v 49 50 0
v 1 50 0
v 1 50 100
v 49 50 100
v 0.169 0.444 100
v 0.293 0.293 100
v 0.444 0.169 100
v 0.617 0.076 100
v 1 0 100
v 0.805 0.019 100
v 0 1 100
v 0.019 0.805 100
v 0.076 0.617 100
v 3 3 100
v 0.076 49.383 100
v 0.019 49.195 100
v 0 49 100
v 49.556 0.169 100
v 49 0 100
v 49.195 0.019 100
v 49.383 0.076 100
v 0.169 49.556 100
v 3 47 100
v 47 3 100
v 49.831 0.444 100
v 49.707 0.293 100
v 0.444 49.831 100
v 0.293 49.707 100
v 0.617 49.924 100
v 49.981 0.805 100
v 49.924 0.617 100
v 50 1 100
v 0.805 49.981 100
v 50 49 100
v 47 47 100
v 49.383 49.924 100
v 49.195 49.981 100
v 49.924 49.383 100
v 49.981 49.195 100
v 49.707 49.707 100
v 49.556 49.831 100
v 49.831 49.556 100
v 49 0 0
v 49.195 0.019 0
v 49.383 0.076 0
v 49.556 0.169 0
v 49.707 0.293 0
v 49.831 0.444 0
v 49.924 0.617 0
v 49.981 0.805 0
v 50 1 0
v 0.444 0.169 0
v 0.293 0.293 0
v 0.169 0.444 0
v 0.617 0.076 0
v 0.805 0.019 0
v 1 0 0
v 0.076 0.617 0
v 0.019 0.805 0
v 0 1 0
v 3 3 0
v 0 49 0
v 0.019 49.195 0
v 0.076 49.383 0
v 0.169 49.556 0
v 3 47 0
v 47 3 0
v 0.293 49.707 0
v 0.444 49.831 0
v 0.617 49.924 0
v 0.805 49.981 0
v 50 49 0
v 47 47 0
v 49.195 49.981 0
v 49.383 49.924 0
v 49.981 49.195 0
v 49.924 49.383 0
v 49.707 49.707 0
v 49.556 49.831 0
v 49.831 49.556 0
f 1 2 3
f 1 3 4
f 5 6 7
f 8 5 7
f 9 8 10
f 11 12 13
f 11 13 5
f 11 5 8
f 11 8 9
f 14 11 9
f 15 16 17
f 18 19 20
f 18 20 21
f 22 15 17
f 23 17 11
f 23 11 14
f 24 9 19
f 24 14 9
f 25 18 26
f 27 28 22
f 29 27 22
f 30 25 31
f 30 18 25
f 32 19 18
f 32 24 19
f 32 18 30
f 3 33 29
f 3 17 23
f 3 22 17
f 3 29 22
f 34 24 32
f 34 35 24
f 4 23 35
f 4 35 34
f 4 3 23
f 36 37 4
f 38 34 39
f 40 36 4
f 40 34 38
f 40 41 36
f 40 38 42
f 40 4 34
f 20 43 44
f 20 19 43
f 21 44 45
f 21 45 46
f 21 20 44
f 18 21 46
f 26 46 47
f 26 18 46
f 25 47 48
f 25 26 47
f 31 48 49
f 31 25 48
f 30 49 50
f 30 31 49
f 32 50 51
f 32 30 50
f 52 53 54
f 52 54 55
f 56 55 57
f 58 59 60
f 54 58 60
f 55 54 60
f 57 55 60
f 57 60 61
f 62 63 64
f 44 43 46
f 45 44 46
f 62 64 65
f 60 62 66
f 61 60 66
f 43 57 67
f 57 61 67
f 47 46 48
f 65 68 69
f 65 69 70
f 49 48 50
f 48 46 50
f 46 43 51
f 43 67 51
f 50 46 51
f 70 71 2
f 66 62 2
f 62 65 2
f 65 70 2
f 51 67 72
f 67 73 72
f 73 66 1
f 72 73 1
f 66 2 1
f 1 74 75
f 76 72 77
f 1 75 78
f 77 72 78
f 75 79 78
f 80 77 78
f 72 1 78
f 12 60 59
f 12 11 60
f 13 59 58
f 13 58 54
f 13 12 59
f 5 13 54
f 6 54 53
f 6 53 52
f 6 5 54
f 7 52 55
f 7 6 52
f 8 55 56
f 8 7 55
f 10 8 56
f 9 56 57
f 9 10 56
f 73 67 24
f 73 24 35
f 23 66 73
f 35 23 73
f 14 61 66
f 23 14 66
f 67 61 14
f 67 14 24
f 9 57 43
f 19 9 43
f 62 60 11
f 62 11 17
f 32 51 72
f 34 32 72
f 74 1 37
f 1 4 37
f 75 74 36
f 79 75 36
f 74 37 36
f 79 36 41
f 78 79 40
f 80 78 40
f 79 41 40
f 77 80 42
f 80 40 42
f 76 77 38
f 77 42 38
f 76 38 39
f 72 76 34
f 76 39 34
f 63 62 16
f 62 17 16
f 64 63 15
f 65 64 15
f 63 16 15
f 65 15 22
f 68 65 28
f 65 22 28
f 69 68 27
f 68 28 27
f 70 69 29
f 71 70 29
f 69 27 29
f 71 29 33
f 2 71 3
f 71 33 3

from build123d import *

# Parameters (mm, degrees)
SKETCH_W   = 50
SKETCH_H   = 50
SKETCH_W_2 = 44
SKETCH_H_2 = 44
PAD_DEPTH  = 100
FILLET_R   = 1


with BuildPart() as part:
    # Sketch → Pad (new body)
    with BuildSketch(Plane.XY):
        with Locations((25, 25)):
            Rectangle(SKETCH_W, SKETCH_H)
        with Locations((25, 25)):
            Rectangle(SKETCH_W_2, SKETCH_H_2, mode=Mode.SUBTRACT)
    extrude(amount=PAD_DEPTH)

    # Fillet
    fillet_edges = [part.edges().sort_by_distance(p)[0] for p in [
        (0, 50, 50),
        (50, 50, 50),
        (50, 0, 50),
        (0, 0, 50),
    ]]
    fillet(fillet_edges, radius=FILLET_R)


solid = part.part
